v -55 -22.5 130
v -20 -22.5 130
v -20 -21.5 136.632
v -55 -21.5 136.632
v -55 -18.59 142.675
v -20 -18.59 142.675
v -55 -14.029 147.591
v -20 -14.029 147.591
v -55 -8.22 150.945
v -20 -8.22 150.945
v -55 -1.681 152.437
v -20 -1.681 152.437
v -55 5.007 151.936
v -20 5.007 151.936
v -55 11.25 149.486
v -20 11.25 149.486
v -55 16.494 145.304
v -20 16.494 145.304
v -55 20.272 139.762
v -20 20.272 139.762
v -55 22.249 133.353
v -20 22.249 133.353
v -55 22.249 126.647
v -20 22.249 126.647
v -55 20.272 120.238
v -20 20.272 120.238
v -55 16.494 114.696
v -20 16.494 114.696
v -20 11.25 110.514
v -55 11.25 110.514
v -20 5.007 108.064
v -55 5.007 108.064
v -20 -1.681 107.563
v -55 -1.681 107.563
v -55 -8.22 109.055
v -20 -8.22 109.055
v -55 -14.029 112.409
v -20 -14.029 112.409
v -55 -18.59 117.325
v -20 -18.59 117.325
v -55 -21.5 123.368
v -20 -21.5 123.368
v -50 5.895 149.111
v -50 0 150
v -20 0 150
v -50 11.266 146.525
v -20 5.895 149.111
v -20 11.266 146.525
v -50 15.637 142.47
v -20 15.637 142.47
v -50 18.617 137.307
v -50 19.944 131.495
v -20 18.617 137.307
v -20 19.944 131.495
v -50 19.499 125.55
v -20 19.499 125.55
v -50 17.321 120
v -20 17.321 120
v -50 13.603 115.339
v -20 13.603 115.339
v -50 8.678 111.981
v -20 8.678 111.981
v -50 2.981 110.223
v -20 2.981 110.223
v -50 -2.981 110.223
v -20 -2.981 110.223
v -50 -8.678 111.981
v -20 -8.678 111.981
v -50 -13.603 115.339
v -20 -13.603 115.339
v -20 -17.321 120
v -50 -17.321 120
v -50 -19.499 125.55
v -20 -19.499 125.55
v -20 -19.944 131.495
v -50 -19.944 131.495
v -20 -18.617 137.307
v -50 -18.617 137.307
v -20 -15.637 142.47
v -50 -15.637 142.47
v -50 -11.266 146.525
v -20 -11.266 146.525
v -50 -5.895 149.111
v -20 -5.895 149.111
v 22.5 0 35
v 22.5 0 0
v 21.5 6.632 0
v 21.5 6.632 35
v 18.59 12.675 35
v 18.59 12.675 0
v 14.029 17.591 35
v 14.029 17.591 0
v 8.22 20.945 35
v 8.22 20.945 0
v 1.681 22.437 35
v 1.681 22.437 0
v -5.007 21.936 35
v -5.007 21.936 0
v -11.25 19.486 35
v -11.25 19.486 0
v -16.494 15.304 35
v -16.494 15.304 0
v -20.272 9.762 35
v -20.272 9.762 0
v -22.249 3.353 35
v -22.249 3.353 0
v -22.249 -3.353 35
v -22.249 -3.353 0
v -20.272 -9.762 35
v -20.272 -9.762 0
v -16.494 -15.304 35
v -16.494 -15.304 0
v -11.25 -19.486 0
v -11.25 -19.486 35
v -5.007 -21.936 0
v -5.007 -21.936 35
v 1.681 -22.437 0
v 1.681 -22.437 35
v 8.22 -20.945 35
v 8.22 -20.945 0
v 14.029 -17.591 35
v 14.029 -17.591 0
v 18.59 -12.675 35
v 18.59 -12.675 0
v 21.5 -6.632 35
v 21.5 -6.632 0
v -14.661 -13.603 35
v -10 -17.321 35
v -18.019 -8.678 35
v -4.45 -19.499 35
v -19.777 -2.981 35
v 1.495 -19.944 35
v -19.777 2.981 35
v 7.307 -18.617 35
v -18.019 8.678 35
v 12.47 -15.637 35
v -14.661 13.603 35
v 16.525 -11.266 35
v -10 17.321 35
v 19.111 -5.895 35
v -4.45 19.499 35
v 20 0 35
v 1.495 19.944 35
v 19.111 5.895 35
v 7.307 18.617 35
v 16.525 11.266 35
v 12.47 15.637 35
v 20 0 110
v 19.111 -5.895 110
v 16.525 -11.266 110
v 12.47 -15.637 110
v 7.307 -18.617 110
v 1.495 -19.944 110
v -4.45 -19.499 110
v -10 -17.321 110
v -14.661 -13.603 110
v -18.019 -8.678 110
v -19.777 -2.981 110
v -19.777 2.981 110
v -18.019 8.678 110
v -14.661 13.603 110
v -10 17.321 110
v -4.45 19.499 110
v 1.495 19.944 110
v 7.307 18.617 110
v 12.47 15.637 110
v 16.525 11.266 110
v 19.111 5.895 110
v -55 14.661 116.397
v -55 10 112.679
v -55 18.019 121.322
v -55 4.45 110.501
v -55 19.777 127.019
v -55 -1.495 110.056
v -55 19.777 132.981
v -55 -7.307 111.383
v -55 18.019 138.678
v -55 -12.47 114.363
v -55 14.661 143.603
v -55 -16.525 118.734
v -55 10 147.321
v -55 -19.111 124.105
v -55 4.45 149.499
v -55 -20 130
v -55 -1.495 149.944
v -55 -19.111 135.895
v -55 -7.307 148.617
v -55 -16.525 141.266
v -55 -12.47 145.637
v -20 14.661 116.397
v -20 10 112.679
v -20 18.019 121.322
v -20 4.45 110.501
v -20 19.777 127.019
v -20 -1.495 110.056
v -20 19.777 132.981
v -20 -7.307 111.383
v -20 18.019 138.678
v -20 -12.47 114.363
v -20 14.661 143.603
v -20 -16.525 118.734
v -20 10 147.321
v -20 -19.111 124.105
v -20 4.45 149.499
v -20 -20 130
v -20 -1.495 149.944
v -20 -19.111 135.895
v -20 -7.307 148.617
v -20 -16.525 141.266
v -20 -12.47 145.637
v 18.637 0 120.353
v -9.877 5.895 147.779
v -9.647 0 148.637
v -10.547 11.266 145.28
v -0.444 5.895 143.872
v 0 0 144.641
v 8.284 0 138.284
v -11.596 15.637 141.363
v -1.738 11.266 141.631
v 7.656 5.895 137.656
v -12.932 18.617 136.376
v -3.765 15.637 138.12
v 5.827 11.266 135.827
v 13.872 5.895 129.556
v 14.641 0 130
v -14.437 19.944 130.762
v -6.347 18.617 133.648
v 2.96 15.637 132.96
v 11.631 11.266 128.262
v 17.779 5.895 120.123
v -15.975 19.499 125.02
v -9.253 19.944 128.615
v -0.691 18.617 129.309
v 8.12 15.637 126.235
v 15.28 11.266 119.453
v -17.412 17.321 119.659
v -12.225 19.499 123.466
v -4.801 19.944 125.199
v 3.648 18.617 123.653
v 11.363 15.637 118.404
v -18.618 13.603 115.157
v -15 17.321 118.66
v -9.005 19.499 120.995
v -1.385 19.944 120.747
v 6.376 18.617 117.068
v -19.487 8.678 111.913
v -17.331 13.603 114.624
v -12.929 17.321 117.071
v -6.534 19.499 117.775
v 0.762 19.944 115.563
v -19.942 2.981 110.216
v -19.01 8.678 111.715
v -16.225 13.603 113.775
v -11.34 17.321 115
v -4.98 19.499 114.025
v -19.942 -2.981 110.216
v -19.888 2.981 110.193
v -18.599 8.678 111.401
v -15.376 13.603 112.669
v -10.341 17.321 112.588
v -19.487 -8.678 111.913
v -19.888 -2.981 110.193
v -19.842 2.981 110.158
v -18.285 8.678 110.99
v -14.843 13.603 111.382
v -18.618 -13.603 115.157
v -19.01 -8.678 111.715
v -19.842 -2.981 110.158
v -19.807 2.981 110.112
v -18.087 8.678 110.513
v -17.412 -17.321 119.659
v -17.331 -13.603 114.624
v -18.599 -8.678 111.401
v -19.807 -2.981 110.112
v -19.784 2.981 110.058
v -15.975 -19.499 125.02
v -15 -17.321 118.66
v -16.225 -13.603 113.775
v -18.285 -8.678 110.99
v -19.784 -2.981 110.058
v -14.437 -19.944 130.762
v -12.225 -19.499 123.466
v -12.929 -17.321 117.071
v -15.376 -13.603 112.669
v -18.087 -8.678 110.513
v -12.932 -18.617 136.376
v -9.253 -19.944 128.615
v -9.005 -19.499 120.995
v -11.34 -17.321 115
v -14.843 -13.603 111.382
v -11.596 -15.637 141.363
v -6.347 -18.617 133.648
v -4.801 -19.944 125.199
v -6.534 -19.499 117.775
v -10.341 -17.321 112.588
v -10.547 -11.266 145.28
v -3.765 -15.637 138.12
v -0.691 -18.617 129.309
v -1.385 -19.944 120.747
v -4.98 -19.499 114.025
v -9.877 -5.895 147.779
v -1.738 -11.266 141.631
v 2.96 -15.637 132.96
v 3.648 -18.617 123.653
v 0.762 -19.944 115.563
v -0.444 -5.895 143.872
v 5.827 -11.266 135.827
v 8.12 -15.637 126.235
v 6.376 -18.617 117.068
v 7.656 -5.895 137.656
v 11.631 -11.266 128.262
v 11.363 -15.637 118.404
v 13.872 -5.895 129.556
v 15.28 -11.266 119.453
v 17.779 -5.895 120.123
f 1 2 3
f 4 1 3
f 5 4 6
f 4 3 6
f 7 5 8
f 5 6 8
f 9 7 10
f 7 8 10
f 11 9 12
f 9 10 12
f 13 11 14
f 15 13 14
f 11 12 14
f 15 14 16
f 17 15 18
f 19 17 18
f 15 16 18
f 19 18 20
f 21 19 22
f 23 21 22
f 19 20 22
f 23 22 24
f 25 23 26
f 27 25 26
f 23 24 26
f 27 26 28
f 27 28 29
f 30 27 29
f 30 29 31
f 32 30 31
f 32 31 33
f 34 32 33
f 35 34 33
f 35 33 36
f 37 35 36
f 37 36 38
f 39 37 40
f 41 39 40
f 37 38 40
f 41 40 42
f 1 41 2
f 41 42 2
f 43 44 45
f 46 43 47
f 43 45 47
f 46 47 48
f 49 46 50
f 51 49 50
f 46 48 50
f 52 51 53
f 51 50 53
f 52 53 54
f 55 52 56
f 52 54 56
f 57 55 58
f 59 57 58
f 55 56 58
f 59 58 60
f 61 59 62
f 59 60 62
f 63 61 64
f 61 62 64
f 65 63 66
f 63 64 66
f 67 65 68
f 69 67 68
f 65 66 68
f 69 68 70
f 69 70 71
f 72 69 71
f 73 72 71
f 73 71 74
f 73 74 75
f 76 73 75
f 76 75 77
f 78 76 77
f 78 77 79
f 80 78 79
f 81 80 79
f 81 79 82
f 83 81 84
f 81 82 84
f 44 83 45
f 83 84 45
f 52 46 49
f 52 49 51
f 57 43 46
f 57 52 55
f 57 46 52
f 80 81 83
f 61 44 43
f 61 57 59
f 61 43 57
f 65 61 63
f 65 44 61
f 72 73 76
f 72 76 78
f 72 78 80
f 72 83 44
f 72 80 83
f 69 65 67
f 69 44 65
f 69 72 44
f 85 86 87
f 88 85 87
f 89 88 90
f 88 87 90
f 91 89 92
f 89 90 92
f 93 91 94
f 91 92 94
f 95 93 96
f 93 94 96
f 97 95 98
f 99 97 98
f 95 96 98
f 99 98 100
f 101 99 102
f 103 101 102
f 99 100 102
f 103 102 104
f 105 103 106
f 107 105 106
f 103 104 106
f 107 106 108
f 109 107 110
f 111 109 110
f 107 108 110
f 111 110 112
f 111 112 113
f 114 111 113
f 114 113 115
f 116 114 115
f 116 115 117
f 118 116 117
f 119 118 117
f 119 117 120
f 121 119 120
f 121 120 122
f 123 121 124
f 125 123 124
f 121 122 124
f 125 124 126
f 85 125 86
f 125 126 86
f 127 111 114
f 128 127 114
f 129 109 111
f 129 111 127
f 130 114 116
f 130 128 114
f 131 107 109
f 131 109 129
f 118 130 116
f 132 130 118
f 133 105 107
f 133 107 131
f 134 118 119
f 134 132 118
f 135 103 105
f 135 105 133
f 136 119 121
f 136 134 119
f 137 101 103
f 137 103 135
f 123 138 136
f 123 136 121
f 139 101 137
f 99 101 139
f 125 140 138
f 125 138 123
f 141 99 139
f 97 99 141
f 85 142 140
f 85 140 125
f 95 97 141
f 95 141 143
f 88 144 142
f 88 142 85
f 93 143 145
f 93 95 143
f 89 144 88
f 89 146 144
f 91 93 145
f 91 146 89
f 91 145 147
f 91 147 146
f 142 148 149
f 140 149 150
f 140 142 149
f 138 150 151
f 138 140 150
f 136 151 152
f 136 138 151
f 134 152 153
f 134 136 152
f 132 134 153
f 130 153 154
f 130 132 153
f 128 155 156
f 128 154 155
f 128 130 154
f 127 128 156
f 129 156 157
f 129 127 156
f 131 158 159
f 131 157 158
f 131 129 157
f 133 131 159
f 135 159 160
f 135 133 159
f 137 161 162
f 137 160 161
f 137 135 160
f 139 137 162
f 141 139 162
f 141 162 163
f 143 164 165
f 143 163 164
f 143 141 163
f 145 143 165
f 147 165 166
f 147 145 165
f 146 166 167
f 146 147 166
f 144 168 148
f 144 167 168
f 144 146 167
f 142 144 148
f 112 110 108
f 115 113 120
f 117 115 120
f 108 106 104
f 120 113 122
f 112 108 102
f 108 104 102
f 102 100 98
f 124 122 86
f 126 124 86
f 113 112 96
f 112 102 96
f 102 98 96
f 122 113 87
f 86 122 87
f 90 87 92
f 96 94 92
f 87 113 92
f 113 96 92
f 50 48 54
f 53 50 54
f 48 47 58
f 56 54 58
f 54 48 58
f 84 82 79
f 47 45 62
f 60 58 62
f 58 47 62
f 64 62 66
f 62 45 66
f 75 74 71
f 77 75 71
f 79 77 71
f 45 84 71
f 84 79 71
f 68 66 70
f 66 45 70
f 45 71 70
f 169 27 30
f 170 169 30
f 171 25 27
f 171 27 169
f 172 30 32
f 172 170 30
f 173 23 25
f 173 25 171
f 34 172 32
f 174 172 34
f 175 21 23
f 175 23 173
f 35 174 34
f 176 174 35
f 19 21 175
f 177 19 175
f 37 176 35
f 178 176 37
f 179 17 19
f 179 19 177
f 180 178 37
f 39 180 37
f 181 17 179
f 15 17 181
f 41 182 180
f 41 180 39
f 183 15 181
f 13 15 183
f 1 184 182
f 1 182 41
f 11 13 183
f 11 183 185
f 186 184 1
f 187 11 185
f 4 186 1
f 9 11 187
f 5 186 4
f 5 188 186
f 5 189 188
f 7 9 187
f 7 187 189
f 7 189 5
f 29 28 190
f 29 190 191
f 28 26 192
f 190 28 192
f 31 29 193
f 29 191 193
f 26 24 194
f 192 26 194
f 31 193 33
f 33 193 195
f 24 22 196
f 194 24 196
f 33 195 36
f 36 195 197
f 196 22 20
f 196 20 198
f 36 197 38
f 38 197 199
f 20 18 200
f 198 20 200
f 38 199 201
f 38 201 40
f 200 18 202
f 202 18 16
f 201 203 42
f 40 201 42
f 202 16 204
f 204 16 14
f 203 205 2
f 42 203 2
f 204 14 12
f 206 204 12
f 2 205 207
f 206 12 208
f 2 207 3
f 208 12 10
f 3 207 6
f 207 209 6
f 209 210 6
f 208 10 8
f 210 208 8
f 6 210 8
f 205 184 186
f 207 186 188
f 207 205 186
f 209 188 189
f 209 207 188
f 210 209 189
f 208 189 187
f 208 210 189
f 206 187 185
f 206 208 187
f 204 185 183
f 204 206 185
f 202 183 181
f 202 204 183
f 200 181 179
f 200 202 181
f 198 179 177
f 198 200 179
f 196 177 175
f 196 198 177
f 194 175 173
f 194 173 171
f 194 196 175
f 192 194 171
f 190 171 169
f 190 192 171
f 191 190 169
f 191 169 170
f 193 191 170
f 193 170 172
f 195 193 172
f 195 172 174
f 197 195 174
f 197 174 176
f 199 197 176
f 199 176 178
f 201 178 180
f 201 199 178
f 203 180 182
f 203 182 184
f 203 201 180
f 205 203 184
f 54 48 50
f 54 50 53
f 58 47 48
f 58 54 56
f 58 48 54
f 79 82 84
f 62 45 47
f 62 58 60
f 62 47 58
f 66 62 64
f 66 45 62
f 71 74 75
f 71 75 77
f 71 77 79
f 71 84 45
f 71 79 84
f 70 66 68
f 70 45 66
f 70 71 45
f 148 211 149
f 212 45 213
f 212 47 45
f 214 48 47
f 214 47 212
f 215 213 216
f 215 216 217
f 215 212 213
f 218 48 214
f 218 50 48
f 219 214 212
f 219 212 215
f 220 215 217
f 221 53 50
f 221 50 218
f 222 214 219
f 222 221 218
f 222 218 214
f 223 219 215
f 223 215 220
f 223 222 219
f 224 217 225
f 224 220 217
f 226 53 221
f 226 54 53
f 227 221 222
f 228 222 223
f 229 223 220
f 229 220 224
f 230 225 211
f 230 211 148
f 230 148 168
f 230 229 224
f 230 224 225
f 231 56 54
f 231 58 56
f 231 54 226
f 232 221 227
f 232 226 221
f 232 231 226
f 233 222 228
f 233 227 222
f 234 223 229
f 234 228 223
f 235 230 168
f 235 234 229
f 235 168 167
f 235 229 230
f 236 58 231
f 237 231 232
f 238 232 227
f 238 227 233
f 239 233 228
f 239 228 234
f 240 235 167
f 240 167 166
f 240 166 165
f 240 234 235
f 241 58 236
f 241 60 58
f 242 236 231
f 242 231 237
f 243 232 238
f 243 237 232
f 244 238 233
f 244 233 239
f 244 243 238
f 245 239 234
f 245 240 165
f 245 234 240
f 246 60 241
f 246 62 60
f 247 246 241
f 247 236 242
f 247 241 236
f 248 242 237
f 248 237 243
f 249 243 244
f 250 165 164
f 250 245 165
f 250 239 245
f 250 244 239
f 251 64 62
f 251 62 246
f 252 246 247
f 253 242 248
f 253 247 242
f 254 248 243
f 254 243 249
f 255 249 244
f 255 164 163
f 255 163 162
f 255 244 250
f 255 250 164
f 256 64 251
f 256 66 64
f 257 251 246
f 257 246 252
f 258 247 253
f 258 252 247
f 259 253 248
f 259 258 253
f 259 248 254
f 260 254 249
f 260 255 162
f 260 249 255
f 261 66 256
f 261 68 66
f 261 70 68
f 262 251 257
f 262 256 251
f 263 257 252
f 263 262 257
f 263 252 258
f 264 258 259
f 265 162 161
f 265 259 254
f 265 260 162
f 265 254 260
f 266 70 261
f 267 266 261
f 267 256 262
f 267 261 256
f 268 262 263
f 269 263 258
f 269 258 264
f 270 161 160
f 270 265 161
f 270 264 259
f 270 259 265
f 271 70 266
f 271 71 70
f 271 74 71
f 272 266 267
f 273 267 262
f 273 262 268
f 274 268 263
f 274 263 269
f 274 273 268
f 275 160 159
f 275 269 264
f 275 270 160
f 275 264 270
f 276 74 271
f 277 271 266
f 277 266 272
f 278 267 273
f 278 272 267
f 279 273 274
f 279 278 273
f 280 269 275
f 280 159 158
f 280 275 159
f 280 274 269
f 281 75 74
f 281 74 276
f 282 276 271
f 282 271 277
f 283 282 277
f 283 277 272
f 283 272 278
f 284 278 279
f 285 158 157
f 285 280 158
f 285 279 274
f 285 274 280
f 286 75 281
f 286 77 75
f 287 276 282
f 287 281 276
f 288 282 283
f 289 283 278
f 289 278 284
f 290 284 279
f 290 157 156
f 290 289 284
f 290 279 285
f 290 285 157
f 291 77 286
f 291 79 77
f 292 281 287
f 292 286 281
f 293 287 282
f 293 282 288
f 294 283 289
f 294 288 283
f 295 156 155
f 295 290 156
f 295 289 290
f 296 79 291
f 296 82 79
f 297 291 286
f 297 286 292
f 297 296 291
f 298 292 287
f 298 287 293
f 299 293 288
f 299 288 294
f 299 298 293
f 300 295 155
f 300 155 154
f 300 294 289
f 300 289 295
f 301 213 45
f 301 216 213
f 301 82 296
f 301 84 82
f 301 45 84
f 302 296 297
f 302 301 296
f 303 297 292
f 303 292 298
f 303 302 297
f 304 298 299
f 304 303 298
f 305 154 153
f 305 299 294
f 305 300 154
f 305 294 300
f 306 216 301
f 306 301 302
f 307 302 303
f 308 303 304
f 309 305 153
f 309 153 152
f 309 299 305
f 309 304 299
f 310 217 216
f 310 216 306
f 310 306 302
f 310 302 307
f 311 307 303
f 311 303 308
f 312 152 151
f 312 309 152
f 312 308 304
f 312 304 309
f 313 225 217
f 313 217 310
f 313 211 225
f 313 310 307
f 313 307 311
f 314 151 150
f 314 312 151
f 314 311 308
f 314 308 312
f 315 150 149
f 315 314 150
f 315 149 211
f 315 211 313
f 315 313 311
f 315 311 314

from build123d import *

# Parameters (mm, degrees)
F1_R     = 20
F3_R     = 22.5
F4_DEPTH = 35
F5_R     = 22.5
F5_R_2   = 20
F6_DEPTH = 35
F7_DEPTH = 30


with BuildPart() as f2:
    # F2: sweep along a path in F0
    with BuildLine(Plane.XZ) as f2_path:
        ThreePointArc((-20, 130), (-5.8578643763, 124.1421356237), (0, 110))
        Line((0, 110), (0, 0))
    # F1 (on Top) → F2 (sweep)
    with BuildSketch(Plane.XY):
        Circle(F1_R)
    sweep(path=f2_path.line)

    # F3 (on Top) → F4 (join)
    with BuildSketch(Plane.XY):
        Circle(F3_R)
    extrude(amount=F4_DEPTH)


with BuildPart() as f6:
    # F5 (on face) → F6 (new body)
    with BuildSketch(Plane(origin=(-20, 0, 0), x_dir=(0, -1, 0), z_dir=(-1, 0, 0))):
        with Locations((0, 130)):
            Circle(F5_R)
        with Locations((0, 130)):
            Circle(F5_R_2, mode=Mode.SUBTRACT)
    extrude(amount=F6_DEPTH)


with BuildPart() as f7:
    # F7 (new): a face of the model
    f7_faces = [f2.part.faces().sort_by_distance(p)[0] for p in [
        (-20, 0, 130),
    ]]
    extrude(f7_faces, amount=F7_DEPTH)


solid = Compound([f2.part, f6.part, f7.part])
